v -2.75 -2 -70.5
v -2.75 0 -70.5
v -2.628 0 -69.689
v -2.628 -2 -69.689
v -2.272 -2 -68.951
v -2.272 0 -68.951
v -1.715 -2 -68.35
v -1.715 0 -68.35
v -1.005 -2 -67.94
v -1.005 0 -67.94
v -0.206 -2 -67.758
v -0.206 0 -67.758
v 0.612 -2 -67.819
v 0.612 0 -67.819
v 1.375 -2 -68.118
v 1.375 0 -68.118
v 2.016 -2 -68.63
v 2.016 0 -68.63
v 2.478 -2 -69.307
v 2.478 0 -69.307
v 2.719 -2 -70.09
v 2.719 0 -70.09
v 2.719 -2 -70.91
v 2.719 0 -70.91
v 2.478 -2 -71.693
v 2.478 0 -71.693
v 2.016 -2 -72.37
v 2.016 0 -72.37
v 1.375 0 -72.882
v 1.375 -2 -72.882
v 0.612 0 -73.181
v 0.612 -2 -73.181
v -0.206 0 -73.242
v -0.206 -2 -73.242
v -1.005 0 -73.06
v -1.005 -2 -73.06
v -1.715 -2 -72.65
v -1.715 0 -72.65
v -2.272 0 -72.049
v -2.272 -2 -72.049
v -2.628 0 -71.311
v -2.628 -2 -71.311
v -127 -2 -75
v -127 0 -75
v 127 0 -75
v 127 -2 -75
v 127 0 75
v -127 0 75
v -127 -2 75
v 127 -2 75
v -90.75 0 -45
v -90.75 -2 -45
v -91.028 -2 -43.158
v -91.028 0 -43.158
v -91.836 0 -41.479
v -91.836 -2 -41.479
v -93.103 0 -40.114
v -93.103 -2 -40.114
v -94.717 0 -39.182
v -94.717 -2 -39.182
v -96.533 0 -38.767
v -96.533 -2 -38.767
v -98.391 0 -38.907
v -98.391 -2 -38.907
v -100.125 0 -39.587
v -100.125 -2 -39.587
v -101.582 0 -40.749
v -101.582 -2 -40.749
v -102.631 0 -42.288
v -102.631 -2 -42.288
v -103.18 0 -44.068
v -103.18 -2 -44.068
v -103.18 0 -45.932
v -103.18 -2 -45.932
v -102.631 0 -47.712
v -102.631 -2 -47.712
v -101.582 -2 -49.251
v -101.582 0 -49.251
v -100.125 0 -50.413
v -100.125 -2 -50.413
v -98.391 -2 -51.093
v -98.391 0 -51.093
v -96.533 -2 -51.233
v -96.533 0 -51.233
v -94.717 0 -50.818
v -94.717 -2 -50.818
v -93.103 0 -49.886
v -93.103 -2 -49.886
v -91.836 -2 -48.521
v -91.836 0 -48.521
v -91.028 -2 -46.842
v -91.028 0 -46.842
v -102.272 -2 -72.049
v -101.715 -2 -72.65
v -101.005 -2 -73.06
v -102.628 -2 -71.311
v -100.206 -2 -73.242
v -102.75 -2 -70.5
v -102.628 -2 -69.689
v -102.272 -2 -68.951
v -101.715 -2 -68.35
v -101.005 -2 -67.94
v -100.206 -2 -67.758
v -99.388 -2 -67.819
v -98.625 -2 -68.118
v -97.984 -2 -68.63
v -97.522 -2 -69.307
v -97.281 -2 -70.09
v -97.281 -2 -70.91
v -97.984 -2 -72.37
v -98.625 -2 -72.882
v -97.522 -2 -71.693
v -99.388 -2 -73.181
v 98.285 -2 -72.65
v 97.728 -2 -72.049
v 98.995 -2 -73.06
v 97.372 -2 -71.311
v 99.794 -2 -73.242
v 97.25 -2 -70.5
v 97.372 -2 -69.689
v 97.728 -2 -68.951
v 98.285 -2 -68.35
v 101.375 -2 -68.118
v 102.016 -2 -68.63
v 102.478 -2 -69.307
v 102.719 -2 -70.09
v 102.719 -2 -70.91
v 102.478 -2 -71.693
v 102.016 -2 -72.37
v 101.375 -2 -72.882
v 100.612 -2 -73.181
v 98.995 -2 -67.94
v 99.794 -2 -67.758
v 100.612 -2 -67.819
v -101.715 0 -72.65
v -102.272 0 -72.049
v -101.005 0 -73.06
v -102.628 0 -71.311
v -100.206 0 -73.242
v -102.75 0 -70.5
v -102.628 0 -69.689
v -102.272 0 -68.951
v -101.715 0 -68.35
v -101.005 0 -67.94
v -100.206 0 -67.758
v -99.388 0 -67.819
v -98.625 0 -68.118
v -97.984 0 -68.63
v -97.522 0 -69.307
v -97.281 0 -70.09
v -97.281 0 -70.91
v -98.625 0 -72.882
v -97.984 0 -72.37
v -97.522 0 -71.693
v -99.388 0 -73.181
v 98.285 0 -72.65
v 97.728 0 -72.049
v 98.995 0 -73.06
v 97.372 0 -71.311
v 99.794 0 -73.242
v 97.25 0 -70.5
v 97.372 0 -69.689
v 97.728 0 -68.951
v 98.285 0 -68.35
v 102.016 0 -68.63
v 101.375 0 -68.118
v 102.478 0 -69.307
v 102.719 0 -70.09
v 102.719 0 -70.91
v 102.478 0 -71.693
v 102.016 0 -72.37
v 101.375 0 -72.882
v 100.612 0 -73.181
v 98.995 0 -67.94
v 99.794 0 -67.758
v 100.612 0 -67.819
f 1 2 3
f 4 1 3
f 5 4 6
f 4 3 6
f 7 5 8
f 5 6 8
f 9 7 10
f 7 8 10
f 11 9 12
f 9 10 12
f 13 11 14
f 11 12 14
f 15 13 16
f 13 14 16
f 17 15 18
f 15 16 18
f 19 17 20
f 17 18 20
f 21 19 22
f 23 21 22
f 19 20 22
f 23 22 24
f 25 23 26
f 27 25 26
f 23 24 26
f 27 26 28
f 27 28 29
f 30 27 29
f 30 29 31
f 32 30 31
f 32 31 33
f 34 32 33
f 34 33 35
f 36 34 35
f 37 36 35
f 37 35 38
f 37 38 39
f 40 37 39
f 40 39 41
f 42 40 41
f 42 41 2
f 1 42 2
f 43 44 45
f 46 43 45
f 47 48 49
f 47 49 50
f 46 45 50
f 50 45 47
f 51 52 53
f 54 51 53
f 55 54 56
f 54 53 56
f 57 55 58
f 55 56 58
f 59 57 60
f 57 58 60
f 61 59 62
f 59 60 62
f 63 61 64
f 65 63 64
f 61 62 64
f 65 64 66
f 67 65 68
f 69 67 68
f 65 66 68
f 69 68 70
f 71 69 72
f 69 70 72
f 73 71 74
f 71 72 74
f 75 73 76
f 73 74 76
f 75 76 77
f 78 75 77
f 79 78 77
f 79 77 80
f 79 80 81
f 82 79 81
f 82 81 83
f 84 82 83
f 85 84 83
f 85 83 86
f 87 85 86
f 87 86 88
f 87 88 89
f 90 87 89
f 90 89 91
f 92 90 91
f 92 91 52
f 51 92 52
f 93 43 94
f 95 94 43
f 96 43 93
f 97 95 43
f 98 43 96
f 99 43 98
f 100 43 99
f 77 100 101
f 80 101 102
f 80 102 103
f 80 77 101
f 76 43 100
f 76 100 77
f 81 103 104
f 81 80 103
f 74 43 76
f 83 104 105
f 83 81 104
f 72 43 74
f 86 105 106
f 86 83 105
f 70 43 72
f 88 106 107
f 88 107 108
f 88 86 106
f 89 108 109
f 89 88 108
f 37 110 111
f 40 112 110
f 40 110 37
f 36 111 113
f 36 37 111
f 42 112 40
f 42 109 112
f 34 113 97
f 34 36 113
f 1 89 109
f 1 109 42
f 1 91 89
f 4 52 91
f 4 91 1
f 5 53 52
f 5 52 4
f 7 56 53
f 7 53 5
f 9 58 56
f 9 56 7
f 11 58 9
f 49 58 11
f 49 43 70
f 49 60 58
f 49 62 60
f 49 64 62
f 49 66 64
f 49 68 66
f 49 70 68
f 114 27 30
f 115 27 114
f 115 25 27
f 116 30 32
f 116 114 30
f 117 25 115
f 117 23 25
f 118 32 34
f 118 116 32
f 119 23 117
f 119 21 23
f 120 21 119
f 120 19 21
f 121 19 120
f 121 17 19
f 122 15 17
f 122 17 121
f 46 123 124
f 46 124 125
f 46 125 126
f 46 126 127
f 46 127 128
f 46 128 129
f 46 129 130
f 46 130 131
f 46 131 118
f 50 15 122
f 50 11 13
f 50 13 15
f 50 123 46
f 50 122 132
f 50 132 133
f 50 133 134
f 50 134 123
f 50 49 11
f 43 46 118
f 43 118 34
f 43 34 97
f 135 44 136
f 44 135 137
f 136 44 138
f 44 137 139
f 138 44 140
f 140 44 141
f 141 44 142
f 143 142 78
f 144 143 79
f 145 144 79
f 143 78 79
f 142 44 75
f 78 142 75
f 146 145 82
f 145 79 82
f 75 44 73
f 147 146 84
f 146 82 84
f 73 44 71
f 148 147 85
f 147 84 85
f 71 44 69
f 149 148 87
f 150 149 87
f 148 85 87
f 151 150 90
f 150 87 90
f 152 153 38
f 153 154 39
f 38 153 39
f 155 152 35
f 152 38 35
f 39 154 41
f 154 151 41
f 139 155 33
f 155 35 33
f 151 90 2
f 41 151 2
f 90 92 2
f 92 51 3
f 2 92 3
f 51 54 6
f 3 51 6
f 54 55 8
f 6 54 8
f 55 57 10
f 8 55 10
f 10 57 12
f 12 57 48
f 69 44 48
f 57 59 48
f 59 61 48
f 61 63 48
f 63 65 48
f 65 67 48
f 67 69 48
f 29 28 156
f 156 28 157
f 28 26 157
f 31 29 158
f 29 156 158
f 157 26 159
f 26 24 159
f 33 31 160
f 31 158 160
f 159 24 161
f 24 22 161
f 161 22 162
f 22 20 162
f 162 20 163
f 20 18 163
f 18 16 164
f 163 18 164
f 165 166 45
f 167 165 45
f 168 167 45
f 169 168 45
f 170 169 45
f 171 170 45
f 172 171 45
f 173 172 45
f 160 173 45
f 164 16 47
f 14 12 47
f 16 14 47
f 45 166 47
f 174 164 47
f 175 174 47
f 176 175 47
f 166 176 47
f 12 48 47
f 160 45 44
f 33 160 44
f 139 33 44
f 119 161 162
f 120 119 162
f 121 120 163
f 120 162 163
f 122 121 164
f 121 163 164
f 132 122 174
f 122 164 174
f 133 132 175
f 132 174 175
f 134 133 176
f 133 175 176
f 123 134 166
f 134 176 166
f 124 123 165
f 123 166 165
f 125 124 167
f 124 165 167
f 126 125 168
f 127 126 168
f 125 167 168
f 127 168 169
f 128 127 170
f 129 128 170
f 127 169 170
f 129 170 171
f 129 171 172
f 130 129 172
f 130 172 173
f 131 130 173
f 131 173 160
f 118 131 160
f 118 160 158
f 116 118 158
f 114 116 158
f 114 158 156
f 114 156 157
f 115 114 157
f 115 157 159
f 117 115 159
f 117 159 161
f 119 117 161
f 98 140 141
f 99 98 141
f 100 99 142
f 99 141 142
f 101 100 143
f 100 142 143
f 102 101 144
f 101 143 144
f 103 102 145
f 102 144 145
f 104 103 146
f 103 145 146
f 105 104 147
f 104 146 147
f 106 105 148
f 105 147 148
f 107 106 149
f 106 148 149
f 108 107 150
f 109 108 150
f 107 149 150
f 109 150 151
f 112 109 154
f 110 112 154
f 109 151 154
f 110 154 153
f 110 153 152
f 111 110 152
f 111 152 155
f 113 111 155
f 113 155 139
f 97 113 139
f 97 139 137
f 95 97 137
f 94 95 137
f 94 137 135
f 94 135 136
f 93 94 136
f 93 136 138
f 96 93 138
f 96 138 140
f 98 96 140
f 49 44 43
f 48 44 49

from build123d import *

# Parameters (mm, degrees)
F0_W     = 254
F0_H     = 150
F1_DEPTH = 2
F2_R     = 6.25
F3_DEPTH = 25
F5_D     = 5.5
F5_DEPTH = 13
F5_TIP   = 1.6523667023


with BuildPart() as f1:
    # F0 (on Front) → F1 (new body)
    with BuildSketch(Plane.XZ):
        Rectangle(F0_W, F0_H)
    extrude(amount=F1_DEPTH)

    # F2 (on face) → F3 (cut)
    with BuildSketch(Plane.XZ.offset(2)):
        with Locations((-97, -45)):
            Circle(F2_R)
    extrude(amount=-F3_DEPTH, mode=Mode.SUBTRACT)

    # F5
    with Locations(Plane.XZ.offset(2)):
        with Locations((-100, -70.5), (0, -70.5), (100, -70.5)):
            Hole(F5_D / 2, depth=F5_DEPTH)
            with Locations((0, 0, -(F5_DEPTH + F5_TIP / 2))):  # 118° drill point
                Cone(0, F5_D / 2, F5_TIP, mode=Mode.SUBTRACT)


solid = f1.part
